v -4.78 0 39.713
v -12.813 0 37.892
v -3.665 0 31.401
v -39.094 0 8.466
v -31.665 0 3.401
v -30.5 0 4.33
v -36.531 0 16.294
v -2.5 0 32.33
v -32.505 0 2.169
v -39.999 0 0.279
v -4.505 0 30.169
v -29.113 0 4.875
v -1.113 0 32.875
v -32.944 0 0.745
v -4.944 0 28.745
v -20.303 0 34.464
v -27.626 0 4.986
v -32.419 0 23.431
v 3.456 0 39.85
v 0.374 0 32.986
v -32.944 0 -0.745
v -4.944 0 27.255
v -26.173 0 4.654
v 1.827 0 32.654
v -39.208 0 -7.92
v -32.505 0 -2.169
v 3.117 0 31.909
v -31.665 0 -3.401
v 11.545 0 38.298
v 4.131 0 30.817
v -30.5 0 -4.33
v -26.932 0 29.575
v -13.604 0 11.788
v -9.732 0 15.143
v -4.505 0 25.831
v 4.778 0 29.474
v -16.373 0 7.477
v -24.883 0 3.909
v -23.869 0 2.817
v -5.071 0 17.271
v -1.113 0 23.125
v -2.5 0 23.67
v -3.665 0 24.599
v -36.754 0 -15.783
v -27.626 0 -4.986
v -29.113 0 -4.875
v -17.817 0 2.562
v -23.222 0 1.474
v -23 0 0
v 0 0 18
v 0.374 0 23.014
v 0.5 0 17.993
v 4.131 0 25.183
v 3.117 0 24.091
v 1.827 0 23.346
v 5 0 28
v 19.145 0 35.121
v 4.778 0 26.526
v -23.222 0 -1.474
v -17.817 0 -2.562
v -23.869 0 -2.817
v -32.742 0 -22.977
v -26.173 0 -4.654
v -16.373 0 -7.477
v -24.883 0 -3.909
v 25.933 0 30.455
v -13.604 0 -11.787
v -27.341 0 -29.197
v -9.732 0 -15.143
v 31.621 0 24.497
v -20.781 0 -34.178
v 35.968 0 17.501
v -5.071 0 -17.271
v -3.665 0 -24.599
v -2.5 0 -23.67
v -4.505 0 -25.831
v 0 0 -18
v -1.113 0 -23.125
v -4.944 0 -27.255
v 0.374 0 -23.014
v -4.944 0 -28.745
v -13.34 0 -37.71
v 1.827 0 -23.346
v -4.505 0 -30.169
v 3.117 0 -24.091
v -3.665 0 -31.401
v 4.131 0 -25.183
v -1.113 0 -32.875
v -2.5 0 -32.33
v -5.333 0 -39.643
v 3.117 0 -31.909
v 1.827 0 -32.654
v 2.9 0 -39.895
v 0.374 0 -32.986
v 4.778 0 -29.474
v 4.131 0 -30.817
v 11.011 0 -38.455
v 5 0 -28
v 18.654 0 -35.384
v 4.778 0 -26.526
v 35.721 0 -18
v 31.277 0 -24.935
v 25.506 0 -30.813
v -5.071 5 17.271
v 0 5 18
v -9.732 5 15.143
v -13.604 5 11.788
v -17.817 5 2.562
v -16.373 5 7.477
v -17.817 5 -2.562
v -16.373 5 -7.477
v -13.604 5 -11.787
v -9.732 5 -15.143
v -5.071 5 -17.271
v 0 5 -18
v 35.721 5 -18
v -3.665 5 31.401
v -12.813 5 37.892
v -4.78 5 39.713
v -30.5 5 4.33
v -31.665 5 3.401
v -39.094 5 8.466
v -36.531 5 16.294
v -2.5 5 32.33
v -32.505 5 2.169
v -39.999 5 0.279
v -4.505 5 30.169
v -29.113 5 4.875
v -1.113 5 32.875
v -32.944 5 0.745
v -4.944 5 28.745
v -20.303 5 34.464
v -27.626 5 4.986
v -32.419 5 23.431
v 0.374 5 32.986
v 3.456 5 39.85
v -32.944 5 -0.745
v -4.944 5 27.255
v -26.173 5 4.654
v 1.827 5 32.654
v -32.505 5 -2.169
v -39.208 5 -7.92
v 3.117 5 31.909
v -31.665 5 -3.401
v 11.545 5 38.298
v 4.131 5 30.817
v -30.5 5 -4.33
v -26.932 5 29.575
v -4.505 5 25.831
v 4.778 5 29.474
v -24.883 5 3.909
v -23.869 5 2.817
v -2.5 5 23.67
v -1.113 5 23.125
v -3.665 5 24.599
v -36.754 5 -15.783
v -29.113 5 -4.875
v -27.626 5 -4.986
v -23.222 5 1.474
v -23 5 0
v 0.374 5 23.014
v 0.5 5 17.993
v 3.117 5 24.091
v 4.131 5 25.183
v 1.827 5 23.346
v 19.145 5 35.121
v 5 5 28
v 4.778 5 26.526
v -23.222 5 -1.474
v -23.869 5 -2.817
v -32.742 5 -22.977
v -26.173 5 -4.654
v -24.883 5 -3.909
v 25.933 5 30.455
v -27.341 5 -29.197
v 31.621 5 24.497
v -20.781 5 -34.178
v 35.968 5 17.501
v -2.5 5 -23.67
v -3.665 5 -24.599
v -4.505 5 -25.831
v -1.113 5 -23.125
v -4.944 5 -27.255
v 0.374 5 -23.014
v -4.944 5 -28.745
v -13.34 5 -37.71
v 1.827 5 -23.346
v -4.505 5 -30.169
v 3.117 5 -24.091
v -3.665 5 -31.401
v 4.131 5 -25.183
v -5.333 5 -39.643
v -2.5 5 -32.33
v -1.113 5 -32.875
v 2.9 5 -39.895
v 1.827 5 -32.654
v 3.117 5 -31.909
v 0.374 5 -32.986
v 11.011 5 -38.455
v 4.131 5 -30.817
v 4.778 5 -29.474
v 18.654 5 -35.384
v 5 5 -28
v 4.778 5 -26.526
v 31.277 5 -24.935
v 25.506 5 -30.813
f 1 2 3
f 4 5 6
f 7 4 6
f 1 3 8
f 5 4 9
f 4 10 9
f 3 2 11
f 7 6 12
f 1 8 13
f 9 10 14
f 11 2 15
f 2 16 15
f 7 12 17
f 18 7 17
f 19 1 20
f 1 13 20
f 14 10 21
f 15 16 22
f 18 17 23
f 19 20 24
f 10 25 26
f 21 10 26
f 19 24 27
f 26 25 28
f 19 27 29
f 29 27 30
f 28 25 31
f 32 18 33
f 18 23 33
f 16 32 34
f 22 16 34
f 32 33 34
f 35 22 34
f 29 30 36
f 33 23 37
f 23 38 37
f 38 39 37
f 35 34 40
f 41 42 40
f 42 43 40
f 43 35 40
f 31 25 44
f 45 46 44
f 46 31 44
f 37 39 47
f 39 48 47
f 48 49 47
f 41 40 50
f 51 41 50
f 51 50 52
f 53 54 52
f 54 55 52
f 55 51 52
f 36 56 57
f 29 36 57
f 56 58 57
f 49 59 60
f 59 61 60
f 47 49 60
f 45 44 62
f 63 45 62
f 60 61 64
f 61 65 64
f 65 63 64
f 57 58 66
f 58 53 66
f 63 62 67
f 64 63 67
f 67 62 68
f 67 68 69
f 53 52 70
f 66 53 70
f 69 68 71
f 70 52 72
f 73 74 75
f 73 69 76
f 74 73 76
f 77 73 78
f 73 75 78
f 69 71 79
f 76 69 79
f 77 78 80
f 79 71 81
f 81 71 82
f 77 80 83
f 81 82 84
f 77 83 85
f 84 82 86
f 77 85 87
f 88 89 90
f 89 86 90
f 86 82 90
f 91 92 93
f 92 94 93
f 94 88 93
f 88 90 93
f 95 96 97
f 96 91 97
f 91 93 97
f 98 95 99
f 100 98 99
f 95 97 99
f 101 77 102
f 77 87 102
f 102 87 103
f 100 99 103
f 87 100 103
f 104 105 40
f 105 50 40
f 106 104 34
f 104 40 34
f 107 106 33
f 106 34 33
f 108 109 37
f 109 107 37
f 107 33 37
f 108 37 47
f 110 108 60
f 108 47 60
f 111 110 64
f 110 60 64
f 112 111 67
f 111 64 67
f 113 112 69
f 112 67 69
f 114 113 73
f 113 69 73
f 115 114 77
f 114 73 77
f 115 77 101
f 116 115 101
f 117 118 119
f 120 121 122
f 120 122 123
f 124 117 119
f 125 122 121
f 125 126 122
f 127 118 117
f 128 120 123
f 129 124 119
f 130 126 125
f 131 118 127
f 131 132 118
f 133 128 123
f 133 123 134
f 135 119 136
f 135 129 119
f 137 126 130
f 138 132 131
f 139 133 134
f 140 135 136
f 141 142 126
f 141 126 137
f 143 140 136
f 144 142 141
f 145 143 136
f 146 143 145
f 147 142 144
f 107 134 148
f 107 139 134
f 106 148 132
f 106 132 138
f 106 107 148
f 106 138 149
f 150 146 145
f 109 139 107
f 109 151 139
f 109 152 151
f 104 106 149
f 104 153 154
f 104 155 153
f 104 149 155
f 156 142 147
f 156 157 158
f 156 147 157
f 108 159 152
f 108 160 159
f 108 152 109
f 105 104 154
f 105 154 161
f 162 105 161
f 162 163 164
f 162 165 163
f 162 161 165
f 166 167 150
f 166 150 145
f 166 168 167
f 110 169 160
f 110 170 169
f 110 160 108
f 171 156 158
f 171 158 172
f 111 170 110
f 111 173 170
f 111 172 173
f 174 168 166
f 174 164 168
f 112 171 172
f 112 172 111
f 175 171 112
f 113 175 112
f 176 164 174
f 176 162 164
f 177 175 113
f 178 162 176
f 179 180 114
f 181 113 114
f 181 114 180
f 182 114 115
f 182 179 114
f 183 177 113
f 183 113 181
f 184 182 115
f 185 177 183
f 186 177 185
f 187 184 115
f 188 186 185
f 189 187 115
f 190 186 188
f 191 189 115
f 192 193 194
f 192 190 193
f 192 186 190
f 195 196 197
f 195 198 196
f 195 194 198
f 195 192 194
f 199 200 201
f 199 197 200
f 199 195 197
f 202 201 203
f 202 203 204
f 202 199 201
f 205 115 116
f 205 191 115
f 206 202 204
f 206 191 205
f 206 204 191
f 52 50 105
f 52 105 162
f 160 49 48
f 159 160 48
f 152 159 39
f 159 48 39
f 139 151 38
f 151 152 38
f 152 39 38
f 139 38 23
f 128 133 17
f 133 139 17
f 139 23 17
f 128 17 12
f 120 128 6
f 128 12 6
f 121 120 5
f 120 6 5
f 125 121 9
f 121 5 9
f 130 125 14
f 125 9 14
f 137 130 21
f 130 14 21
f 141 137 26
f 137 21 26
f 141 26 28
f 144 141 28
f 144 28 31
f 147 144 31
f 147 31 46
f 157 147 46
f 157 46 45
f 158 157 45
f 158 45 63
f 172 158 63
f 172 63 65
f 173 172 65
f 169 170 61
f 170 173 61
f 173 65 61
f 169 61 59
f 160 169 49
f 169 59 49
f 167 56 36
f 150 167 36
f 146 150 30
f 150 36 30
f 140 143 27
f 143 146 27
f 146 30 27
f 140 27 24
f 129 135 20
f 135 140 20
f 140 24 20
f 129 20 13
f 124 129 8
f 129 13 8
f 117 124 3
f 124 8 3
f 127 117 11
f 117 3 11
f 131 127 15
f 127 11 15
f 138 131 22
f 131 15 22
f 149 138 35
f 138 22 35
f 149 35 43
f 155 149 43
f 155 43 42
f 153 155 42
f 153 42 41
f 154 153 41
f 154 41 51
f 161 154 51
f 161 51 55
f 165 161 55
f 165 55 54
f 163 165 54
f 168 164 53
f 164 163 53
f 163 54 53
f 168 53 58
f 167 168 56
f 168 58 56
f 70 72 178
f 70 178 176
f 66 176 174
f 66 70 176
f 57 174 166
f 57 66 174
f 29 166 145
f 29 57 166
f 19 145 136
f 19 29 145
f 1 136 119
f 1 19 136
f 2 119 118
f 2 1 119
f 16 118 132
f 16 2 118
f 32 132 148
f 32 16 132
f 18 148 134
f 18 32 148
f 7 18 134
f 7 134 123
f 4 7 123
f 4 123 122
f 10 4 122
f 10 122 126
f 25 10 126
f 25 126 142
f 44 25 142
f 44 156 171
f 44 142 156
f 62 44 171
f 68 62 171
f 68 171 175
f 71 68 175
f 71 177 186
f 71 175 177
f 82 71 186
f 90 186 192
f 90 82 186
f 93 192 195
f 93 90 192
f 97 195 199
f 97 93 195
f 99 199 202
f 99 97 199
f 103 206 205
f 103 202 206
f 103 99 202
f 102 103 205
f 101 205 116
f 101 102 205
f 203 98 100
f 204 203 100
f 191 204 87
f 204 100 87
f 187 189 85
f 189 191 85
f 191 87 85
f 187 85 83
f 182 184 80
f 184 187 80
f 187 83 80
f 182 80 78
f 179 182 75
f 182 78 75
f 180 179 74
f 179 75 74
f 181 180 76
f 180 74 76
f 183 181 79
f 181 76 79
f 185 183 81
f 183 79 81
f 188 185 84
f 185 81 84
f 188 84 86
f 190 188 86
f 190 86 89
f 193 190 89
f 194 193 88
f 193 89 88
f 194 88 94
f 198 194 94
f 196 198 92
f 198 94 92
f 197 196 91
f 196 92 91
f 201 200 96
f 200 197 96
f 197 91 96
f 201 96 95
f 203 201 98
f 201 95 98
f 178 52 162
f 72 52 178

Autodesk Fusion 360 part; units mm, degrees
sketch "Sketch1" plane through (0, 0, 0) normal (0, 1, 0) x (1, 0, 0)
  line L0 (0, 18) -> (35.7211, 18)
  line L1 (0, -18) -> (35.9683, -17.5009)
  arc A0 (35.7211, 18) -> (35.9683, -17.5009) centre (0, 0) ccw
  arc A1 (0, 18) -> (0.4995, -17.9931) centre (0, 0) ccw
  circle A2 centre (0, 28) radius 5
  circle A3 centre (0, -28) radius 5
  circle A4 centre (-28, 0) radius 5
  dimension "d1" = 80
  dimension "d2" = 36
  dimension "d4" = 28
  dimension "d5" = 28
  dimension "d6" = 28
  dimension "d7" = 10
  dimension "d8" = 10
  dimension "d9" = 10
extrude "Extrude1" add sketch "Sketch1" along normal blind 5
